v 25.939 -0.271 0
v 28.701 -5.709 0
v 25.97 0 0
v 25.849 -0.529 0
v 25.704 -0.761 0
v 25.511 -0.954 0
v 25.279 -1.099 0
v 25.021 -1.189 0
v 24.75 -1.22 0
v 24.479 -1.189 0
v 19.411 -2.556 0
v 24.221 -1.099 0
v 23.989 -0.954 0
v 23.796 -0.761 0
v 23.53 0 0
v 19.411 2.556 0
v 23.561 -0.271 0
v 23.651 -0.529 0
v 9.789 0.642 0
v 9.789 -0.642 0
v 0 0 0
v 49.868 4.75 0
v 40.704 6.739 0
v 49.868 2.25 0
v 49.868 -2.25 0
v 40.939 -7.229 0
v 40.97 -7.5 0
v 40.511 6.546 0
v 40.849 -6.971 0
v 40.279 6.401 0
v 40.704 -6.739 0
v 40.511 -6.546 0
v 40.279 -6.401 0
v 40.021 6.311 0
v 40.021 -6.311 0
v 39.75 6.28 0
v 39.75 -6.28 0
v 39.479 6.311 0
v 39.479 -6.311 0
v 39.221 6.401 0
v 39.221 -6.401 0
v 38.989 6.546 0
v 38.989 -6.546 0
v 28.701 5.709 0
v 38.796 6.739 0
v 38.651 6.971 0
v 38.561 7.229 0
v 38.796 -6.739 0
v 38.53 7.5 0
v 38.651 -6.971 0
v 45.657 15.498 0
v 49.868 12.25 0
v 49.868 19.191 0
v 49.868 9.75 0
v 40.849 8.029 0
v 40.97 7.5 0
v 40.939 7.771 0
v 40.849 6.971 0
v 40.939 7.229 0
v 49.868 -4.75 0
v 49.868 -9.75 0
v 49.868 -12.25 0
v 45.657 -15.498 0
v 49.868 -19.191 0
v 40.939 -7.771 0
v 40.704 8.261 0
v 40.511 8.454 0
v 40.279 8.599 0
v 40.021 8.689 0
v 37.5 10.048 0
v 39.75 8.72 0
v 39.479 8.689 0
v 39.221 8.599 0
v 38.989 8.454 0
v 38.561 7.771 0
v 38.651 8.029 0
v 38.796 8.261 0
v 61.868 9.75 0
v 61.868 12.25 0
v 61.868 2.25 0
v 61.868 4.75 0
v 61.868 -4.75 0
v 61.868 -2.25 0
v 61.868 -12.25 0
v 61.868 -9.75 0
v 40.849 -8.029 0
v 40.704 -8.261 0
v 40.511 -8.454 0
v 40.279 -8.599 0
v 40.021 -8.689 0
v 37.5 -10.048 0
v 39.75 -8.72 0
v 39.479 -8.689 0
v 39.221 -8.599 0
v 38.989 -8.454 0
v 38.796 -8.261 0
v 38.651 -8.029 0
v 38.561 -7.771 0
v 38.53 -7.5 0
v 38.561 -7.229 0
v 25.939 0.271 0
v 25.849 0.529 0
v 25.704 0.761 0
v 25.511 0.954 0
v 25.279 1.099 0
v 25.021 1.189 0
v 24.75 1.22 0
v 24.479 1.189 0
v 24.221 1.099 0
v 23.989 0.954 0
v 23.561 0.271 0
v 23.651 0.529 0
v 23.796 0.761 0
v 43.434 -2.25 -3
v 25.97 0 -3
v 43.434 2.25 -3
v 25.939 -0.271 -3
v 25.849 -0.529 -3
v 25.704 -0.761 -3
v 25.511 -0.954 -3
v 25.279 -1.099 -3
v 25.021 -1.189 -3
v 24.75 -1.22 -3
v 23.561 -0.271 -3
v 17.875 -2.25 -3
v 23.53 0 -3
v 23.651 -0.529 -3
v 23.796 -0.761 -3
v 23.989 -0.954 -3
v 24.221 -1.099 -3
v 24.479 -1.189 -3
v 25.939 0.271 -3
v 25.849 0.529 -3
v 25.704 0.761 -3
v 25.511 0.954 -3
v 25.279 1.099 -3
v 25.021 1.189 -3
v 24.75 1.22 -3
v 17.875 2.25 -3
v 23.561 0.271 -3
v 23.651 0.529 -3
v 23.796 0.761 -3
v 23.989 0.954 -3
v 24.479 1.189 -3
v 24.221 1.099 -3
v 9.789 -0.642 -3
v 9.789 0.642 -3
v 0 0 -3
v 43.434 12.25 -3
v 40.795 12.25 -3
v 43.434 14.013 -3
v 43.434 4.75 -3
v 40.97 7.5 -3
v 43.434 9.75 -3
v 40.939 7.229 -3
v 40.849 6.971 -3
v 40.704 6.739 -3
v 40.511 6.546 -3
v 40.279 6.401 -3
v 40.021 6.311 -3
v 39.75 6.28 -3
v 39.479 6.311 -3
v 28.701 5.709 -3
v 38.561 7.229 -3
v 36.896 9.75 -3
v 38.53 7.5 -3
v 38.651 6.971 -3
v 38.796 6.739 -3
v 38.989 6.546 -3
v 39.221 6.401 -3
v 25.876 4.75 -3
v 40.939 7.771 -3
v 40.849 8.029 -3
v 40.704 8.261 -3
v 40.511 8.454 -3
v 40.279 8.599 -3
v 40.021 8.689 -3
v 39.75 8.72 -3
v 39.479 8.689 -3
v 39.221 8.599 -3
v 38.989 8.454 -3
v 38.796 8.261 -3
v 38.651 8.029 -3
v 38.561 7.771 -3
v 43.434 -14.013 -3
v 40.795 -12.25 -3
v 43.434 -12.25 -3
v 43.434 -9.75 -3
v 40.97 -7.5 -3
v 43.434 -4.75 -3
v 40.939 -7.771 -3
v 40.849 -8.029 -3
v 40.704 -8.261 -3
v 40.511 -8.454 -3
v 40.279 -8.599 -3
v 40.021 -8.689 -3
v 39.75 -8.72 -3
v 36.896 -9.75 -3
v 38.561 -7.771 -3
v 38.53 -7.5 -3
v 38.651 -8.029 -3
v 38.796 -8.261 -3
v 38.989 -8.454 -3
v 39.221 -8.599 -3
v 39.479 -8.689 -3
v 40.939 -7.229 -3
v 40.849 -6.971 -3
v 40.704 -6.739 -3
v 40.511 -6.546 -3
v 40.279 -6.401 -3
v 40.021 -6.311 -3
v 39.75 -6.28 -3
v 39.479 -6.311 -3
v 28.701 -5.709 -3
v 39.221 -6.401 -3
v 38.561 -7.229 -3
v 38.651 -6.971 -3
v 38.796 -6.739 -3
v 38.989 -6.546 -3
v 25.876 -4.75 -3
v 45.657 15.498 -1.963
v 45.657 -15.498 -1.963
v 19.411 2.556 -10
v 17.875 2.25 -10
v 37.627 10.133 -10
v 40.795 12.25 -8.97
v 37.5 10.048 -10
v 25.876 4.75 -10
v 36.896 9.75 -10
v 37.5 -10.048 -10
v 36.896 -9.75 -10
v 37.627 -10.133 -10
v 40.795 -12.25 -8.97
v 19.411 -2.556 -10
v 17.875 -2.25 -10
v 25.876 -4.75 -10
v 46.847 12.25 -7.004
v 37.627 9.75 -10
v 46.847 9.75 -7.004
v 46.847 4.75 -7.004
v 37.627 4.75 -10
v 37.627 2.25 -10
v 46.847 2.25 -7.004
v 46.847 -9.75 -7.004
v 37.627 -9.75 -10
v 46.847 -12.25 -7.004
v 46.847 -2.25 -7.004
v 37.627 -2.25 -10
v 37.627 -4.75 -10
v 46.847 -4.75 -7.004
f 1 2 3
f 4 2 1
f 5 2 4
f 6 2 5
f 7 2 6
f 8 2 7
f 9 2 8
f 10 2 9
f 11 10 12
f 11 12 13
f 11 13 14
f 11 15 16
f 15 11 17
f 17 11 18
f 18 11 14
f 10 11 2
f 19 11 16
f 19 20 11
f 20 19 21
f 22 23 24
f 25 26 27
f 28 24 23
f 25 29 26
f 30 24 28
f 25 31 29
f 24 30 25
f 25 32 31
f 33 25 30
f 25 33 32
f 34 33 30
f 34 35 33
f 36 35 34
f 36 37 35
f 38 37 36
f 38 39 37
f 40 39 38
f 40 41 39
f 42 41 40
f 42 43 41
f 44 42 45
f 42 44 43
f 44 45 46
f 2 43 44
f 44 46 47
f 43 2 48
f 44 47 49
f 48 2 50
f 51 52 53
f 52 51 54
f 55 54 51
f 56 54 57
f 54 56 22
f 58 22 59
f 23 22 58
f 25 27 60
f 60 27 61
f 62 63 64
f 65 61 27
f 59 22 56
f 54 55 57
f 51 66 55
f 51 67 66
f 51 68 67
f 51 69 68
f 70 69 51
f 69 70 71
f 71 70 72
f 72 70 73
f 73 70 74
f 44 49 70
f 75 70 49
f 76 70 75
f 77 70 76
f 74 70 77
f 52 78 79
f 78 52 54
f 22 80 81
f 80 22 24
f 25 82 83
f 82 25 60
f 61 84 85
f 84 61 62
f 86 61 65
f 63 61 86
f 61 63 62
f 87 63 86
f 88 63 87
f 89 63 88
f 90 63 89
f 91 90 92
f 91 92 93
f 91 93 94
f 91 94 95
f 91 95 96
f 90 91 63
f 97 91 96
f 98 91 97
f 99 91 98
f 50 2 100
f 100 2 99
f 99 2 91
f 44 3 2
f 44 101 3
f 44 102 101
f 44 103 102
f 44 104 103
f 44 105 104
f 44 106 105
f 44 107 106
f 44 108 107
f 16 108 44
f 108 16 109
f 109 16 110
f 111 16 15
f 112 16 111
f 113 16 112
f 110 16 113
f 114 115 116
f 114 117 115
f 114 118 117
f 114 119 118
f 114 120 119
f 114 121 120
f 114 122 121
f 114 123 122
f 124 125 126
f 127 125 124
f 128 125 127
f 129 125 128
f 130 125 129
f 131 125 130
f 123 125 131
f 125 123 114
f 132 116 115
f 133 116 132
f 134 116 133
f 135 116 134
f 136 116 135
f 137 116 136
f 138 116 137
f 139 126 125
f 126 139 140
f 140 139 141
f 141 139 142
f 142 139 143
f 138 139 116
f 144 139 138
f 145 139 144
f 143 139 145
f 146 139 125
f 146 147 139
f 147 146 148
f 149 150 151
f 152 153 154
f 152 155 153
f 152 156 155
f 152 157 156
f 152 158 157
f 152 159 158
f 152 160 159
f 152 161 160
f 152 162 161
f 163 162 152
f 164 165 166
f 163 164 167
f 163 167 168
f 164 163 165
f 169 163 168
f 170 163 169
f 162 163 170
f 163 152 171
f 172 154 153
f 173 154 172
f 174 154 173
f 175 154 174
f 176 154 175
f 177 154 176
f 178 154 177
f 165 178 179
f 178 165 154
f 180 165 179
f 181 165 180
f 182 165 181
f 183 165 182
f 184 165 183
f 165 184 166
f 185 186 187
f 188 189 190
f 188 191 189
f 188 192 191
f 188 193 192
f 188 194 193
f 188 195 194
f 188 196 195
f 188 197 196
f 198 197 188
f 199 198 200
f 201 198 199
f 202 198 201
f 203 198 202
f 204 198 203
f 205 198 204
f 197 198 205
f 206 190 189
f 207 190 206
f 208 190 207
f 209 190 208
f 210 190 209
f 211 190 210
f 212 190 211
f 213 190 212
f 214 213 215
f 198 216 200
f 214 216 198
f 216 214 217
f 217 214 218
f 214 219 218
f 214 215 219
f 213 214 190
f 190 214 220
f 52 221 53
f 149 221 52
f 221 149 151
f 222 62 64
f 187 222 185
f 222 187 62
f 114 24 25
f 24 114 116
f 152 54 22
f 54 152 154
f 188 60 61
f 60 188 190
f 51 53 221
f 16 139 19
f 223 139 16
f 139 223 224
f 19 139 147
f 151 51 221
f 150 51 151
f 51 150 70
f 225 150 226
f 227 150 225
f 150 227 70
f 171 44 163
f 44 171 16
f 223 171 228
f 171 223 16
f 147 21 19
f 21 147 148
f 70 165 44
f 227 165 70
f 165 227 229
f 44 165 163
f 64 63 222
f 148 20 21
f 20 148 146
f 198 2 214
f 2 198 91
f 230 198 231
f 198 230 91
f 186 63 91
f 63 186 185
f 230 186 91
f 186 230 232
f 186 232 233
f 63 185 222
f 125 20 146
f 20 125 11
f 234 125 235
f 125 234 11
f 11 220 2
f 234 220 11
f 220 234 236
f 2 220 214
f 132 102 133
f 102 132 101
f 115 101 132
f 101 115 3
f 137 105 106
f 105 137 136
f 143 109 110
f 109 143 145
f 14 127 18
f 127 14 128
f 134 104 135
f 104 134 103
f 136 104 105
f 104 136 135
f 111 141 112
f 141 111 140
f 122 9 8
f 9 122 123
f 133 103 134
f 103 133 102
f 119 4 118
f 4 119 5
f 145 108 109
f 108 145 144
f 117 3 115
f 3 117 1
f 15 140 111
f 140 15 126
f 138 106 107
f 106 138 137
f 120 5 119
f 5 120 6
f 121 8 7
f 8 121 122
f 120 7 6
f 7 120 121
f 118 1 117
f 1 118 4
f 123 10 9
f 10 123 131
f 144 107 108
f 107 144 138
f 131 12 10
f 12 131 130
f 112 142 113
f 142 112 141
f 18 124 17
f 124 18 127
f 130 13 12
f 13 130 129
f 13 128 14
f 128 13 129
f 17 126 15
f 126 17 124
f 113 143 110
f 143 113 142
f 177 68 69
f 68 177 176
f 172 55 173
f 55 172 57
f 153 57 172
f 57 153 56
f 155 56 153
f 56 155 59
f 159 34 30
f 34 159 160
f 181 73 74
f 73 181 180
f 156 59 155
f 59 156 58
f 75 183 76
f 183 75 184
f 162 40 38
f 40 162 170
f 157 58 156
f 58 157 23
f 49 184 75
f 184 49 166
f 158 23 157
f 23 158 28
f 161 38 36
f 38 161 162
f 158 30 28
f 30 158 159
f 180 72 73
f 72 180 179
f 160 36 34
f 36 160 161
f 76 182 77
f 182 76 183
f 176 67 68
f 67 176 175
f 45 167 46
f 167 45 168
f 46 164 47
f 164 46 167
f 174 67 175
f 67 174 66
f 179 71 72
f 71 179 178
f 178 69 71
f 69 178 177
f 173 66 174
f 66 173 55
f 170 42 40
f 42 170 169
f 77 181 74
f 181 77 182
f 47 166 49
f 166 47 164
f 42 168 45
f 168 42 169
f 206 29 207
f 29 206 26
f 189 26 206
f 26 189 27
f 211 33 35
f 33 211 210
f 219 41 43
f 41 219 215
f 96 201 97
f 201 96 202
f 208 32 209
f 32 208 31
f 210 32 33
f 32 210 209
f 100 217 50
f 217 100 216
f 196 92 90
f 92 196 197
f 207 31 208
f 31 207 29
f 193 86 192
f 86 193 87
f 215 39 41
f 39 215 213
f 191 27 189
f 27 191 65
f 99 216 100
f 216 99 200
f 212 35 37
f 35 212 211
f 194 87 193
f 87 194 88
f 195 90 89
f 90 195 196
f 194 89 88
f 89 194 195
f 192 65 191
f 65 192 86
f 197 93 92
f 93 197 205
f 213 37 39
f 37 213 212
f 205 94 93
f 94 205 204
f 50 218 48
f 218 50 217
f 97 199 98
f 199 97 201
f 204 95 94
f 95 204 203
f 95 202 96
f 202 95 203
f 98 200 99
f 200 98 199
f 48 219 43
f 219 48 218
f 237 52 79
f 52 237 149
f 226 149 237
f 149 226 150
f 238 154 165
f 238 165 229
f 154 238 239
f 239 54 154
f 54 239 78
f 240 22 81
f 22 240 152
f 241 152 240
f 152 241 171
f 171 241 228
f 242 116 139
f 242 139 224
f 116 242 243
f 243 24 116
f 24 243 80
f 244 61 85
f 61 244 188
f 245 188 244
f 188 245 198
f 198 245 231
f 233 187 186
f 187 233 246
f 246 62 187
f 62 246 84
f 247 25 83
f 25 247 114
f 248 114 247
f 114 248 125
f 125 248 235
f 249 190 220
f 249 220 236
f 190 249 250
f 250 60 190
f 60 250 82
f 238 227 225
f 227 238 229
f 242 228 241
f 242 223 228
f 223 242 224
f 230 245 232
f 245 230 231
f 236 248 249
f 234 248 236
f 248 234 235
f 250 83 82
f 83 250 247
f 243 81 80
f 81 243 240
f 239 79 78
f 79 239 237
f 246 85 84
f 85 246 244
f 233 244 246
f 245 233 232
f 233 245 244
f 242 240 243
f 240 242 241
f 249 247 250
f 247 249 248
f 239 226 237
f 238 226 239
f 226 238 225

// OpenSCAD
// ----------------------------------------------------------------------------------------------------
// PROJECT INFORMATION

// NAME:  R/C Mower Trailer
// REVISION:  A1
// START DATE:  8/20/2021
// CURRENT VERSION DATE:  9/8/2021
// LICENSE:  GPLv3
// AUTHOR:  Justin Grimes (@zelon88)
// DESCRIPTION:  A tow-behind lawn mowing attachment for retrofit onto low-speed R/C vehicles.
// ----------------------------------------------------------------------------------------------------

// ----------------------------------------------------------------------------------------------------
// PART INFORMATION

// NAME:  Center Bracket Skid Plate
// REVISION:  A1
// START DATE:  7/16/2026
// CURRENT VERSION DATE:  7/16/2026
// AUTHOR:  Justin Grimes (@zelon88)
// DESCRIPTION:
//    A protective skid plate that mounts to the bottom of the Center Bracket.
//    Features relief cutouts for the Body Skirts, support braces for the Center Bracket Support,
//    and a chamfered front edge that clears the Hopper Bracket.
// FILE NAME: Center_Bracket_Skid_Plate.scad
// ----------------------------------------------------------------------------------------------------

// ----------------------------------------------------------------------------------------------------
// PRINTER CONFIGURATION
// [Printing instructions to be added]
// ----------------------------------------------------------------------------------------------------

// ----------------------------------------------------------------------------------------------------
// MANUFACTURING INSTRUCTIONS
// [Manufacturing instructions to be added]
// ----------------------------------------------------------------------------------------------------

// ----------------------------------------------------------------------------------------------------
// GEOMETRY

module Center_Bracket_Skid_Plate() {
  difference() {
    // Create the body of the Center Bracket Skid Plate.
    translate([25, 0, -1.5]) cube([50, 40, 3], center=true);
    translate([58, 0, -10]) rotate([0, 65, 0]) cube([25, 125, 100], center=true);
    // Cut out circles for the Body Skirts.
    translate([0, 75, -5]) cylinder($fn=48, r=75, h=10, center=true);
    translate([0, -75, -5]) cylinder($fn=48, r=75, h=10, center=true);
    // Drill through holes for mounting screws.
    translate([24.75, 0, -5]) cylinder(r=1.22, h=20, $fn=28, center=true);
    translate([39.75, 7.5, -5]) cylinder(r=1.22, h=20, $fn=28, center=true);
    translate([39.75, -7.5, -5]) cylinder(r=1.22, h=20, $fn=28, center=true); }

  difference() {
    union() {
      // Create the support braces for the Center Bracket support.
      translate([32.5, 11, -8.75]) cube([65, 2.5, 17.5], center=true);
      translate([32.5, 3.5, -8.75]) cube([65, 2.5, 17.5], center=true);
      translate([32.5, -11, -8.75]) cube([65, 2.5, 17.5], center=true);
      translate([32.5, -3.5, -8.75]) cube([65, 2.5, 17.5], center=true); }

    // Cut out circles for the Body Skirts.
    translate([0, 75, -5]) cylinder($fn=48, r=75, h=10, center=true);
    translate([0, -75, -5]) cylinder($fn=48, r=75, h=10, center=true);

    // Chamfer the front edge of the Hopper Bracket.
    translate([70, 0, -10]) rotate([0, 65, 0]) cube([25, 50, 100], center=true);
    translate([75, 0, -11]) rotate([0, 72, 0]) cube([25, 50, 120], center=true);
    translate([20, 0, -22.5]) rotate([0, 0, 0]) cube([50, 150, 25], center=true); } }

// Render the object.
// Comment or uncomment as needed.
Center_Bracket_Skid_Plate();

// Render the object for printing.
// Comment or uncomment as needed.
//Center_Bracket_Skid_Plate();
// ----------------------------------------------------------------------------------------------------
